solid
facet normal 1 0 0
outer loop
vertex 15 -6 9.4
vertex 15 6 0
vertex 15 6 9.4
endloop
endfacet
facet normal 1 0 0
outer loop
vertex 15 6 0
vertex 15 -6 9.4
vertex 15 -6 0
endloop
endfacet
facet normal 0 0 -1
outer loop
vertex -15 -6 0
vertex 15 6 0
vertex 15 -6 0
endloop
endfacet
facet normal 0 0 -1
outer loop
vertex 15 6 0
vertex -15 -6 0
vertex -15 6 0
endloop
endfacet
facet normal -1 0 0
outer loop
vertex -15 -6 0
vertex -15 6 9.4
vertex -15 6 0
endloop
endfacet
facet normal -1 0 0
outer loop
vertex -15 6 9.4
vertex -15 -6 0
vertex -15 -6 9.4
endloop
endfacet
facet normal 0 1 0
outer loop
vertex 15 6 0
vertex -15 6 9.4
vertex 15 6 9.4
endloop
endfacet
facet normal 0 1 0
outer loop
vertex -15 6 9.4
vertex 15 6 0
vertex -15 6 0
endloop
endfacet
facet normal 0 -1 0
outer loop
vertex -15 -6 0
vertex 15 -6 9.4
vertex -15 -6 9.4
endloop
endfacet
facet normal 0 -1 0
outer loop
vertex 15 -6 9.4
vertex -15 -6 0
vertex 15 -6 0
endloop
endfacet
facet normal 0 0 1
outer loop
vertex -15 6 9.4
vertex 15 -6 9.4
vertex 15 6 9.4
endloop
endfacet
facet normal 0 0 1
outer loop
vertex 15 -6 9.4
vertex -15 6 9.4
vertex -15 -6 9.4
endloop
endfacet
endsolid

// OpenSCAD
// ---------- PANEL / CLAMP PARAMETERS ----------
panel_thickness   = 3;      // thickness of the surface you clamp to
clamp_gap         = panel_thickness + 0.4; // tolerance
clamp_depth       = 12;
clamp_width       = 30;
clamp_thickness   = 3;

// Screw holes to join front plate + clamp
join_hole_d       = 3.2;    // M3 clearance
join_hole_offsetY = 10;     // distance from center up/down

module clamp_back() {
    difference() {
        // U-shaped block
        union() {
            // front leg
            translate([-clamp_width/2, -clamp_depth/2, 0])
                cube([clamp_width, clamp_depth, clamp_thickness]);

            // back leg
            translate([-clamp_width/2, -clamp_depth/2, clamp_gap + clamp_thickness])
                cube([clamp_width, clamp_depth, clamp_thickness]);

            // bridge
            translate([-clamp_width/2, -clamp_depth/2, clamp_thickness])
                cube([clamp_width, clamp_depth, clamp_gap]);
        }

        // screw holes (to join to camera plate)
        for (y = [-join_hole_offsetY, join_hole_offsetY]) {
            translate([0, y, -1])
                cylinder(h = clamp_thickness + clamp_gap + clamp_thickness + 2,
                         d = join_hole_d, $fn = 32);
        }
    }
}

clamp_back();
